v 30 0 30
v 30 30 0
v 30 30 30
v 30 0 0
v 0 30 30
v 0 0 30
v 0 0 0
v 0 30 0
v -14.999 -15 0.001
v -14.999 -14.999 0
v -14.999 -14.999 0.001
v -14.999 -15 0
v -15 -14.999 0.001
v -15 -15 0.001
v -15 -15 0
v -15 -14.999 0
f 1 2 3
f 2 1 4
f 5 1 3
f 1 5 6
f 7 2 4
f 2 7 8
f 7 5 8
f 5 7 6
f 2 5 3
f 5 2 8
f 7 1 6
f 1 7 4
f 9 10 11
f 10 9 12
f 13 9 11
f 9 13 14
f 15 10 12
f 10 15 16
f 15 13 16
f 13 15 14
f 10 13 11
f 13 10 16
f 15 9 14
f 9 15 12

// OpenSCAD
/* [Dimensions] */
// Cube side length
size = 30; // [5:200]

$fn = 64;

cube([size, size, size], center = false);

// Center on origin in XY, sit flat on z=0
// (translate applied via wrapper below)
translate([-size/2, -size/2, 0]) cube(0.001); // no-op placeholder removed
